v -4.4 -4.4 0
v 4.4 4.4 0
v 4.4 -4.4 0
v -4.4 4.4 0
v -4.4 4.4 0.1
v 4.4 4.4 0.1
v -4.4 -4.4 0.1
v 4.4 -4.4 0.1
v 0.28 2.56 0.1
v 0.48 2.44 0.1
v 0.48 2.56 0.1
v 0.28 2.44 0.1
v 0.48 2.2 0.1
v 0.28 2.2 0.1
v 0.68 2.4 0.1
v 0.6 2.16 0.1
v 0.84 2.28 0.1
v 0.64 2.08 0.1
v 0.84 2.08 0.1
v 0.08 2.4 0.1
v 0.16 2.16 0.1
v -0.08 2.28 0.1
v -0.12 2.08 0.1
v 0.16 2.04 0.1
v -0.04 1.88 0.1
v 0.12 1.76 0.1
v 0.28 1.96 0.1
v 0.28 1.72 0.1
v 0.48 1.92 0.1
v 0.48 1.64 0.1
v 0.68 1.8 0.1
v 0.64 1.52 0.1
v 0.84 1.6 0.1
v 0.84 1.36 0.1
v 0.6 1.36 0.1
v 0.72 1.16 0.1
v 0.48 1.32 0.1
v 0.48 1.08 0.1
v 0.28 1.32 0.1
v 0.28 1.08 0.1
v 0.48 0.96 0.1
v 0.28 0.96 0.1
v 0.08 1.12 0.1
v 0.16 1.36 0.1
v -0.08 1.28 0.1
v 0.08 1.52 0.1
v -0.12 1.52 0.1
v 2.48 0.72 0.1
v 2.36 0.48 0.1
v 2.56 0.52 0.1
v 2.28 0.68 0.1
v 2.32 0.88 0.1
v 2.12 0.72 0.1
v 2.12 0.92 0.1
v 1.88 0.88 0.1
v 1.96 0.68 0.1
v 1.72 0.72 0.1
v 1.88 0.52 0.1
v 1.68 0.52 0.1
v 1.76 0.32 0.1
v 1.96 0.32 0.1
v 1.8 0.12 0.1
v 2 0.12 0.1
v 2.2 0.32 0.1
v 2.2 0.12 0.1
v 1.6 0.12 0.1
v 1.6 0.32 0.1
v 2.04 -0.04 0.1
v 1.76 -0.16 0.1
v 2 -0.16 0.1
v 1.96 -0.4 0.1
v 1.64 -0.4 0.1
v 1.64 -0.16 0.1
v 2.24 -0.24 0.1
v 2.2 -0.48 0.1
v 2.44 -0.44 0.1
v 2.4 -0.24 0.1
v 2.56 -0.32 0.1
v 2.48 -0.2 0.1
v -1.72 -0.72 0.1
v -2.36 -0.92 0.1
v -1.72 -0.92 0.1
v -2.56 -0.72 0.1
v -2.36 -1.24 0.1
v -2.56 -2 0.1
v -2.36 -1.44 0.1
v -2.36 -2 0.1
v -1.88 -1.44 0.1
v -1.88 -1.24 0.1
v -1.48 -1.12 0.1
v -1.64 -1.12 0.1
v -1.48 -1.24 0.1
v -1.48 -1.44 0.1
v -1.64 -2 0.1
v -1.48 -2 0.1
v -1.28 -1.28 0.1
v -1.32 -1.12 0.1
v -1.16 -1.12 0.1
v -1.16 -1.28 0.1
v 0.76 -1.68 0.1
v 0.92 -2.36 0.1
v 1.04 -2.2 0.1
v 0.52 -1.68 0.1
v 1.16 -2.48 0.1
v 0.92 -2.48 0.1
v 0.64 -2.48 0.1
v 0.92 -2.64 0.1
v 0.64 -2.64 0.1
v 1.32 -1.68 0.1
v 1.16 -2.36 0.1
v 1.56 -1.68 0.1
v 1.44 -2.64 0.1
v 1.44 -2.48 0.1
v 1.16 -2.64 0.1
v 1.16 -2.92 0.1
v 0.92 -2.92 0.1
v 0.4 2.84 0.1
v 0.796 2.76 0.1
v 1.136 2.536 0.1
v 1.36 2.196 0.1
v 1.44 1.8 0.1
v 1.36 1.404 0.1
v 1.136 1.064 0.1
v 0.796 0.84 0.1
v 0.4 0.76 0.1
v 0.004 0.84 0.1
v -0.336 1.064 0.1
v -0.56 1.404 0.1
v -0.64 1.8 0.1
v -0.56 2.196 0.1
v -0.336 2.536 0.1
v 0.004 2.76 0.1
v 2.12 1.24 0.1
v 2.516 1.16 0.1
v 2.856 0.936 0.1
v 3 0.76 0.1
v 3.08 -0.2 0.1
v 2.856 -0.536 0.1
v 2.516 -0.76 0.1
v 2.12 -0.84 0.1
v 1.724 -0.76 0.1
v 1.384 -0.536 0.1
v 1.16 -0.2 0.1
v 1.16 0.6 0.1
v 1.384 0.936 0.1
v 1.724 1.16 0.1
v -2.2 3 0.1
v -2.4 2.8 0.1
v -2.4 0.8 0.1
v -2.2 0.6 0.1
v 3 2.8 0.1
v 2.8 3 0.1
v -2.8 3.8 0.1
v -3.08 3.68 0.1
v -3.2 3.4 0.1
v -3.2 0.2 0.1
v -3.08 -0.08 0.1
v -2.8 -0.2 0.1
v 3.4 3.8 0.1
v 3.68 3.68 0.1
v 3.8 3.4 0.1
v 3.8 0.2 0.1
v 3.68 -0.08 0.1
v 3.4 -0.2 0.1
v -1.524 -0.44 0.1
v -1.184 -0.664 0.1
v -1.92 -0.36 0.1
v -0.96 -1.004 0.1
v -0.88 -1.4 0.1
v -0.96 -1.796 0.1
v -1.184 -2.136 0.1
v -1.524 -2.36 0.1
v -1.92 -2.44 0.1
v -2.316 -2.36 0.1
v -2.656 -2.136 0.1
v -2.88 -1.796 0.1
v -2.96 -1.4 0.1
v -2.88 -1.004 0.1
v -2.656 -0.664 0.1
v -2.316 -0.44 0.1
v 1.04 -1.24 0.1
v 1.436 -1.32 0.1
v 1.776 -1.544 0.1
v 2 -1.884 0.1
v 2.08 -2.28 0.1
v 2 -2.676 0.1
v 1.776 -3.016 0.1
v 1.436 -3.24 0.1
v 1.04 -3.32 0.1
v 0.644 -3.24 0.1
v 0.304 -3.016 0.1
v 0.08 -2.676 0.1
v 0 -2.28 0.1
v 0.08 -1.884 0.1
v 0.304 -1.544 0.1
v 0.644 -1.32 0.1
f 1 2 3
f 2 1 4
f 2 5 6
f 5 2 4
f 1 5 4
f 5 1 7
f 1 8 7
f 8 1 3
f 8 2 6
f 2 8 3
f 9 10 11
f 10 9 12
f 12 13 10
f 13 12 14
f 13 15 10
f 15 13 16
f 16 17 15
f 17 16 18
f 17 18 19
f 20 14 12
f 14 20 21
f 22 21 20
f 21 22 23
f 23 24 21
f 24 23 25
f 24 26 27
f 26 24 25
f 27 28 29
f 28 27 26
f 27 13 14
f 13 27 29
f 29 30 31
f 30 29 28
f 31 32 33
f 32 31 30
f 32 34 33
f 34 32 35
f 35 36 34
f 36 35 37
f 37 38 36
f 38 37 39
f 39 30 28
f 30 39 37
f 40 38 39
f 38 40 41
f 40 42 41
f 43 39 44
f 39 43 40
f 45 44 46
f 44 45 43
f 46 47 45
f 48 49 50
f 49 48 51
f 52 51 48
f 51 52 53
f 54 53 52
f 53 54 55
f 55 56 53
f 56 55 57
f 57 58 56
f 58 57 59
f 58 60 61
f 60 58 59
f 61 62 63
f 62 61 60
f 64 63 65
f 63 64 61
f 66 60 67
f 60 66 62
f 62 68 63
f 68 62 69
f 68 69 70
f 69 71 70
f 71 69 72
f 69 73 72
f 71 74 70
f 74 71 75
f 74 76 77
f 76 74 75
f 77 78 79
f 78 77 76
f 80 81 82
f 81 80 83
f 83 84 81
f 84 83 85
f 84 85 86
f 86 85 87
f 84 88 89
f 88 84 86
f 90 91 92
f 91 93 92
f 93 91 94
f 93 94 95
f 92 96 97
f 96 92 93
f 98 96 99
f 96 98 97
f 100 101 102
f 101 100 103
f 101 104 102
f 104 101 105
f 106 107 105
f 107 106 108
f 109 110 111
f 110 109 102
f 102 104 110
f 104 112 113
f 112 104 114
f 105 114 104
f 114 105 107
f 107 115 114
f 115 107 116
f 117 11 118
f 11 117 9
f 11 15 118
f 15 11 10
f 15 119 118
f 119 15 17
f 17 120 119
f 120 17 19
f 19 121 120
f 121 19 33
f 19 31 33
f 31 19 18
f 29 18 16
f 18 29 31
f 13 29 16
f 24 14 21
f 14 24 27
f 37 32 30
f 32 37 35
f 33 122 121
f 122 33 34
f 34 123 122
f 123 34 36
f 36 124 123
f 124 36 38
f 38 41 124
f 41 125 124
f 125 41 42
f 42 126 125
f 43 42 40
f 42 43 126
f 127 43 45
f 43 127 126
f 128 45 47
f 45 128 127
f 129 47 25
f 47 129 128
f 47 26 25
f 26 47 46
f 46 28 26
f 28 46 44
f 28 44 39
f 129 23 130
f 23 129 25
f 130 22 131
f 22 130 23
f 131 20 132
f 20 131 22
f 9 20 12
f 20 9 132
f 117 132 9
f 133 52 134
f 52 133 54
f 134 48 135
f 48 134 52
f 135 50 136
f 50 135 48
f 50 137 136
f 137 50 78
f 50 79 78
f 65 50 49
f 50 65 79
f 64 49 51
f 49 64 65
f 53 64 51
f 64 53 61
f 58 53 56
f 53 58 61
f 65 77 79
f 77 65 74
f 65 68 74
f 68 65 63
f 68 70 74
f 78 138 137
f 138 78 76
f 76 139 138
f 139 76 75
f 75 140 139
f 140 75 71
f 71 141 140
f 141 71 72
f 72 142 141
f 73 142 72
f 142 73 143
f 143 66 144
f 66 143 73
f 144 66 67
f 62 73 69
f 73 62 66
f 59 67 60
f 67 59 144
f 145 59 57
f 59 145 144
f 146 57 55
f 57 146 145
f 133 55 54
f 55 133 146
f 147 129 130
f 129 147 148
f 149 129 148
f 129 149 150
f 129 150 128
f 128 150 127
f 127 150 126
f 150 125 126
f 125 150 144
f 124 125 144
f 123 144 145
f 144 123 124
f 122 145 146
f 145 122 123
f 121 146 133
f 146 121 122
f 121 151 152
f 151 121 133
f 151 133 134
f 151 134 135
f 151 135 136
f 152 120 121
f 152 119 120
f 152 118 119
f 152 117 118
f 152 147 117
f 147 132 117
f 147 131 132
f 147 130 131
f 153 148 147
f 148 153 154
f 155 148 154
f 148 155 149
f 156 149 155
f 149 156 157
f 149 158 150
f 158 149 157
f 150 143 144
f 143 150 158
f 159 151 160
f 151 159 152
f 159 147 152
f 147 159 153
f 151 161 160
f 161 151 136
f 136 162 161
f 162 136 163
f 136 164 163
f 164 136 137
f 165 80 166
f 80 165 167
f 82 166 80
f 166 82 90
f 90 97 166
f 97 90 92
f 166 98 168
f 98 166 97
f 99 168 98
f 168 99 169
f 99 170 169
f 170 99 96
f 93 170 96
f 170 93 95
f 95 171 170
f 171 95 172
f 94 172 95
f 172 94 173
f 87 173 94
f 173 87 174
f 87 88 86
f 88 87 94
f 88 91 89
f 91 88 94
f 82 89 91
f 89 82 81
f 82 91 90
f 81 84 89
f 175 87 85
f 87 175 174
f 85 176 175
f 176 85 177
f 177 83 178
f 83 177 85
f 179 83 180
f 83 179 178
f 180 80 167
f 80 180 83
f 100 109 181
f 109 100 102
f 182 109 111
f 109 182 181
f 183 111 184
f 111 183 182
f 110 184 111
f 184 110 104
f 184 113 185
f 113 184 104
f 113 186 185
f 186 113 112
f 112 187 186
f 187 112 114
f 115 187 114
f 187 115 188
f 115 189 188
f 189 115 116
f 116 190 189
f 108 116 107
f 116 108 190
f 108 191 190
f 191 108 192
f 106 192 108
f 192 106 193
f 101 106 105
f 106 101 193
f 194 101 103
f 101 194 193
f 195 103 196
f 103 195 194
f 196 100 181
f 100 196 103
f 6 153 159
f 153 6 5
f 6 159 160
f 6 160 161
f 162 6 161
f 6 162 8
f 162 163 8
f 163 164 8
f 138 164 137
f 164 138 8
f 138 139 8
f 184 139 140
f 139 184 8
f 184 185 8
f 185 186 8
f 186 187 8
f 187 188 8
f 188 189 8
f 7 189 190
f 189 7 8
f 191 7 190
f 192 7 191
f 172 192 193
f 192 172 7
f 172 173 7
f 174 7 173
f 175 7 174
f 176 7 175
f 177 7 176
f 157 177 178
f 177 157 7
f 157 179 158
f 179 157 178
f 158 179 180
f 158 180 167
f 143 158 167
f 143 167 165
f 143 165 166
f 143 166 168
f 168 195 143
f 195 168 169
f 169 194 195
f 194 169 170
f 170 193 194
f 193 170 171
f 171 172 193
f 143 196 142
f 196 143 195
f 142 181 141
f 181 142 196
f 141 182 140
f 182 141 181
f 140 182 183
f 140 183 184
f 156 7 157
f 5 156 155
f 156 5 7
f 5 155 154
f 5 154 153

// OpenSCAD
// file: ../p/box5-12.scad
use <../lib.scad>
function ldraw_lib__box5_12() = [
// 0 Box with 5 Faces without Any Edges
// 0 Name: box5-12.dat
// 0 Author: Chris Dee [cwdee]
// 0 !LDRAW_ORG Primitive UPDATE 2009-02
// 0 !LICENSE Licensed under CC BY 2.0 and CC BY 4.0 : see CAreadme.txt
// 
// 0 BFC CERTIFY CCW
  [0,"BFC","CERTIFY"],
  [0,"BFC","CCW"],
// 
// 0 !HISTORY 2009-09-03 [PTadmin] Official Update 2009-02
// 
// 
// 4 16 1 1 1 1 1 -1 -1 1 -1 -1 1 1
  [4,16,1,1,1,1,1,-1,-1,1,-1,-1,1,1],
// 4 16 -1 0 1 1 0 1 1 1 1 -1 1 1
  [4,16,-1,0,1,1,0,1,1,1,1,-1,1,1],
// 4 16 -1 0 -1 -1 0 1 -1 1 1 -1 1 -1
  [4,16,-1,0,-1,-1,0,1,-1,1,1,-1,1,-1],
// 4 16 1 0 -1 -1 0 -1 -1 1 -1 1 1 -1
  [4,16,1,0,-1,-1,0,-1,-1,1,-1,1,1,-1],
// 4 16 1 0 1 1 0 -1 1 1 -1 1 1 1
  [4,16,1,0,1,1,0,-1,1,1,-1,1,1,1],
// 0
];
makepoly(ldraw_lib__box5_12(), line=0.2);
// main file
use <../lib.scad>
use <../p/box5-12.scad>
function ldraw_lib__164555g() = [
// 0 Sticker  1.1 x  1.1 with White Banknote and Coins on Black Background
// 0 Name: 164555g.dat
// 0 Author: Takeshi Takahashi [RainbowDolphin]
// 0 !LDRAW_ORG Part UPDATE 2022-06
// 0 !LICENSE Licensed under CC BY 2.0 and CC BY 4.0 : see CAreadme.txt
// 
// 0 BFC CERTIFY CCW
  [0,"BFC","CERTIFY"],
  [0,"BFC","CCW"],
// 
// 0 !KEYWORDS Bricklink 4554stk01, Brickowl 156966, Briefcase, Currency exchange
// 0 !KEYWORDS Rebrickable 164555, Set 4554, Station, Train
// 
// 0 !HISTORY 2022-12-20 [PTadmin] Official Update 2022-06
// 
// 
// 1 16 0 -0.25 0 11 0 0 0 0.25 0 0 0 11 box5-12.dat
  [1,16,0,-0.25,0,11,0,0,0,0.25,0,0,0,11, ldraw_lib__box5_12()],
// 4 0 1.2 -0.25 6.4 0.7 -0.25 6.4 0.7 -0.25 6.1 1.2 -0.25 6.1
  [4,0,1.2,-0.25,6.4,0.7,-0.25,6.4,0.7,-0.25,6.1,1.2,-0.25,6.1],
// 4 0 1.2 -0.25 6.1 0.7 -0.25 6.1 0.7 -0.25 5.5 1.2 -0.25 5.5
  [4,0,1.2,-0.25,6.1,0.7,-0.25,6.1,0.7,-0.25,5.5,1.2,-0.25,5.5],
// 4 0 1.7 -0.25 6 1.2 -0.25 6.1 1.2 -0.25 5.5 1.5 -0.25 5.4
  [4,0,1.7,-0.25,6,1.2,-0.25,6.1,1.2,-0.25,5.5,1.5,-0.25,5.4],
// 4 0 2.1 -0.25 5.7 1.7 -0.25 6 1.5 -0.25 5.4 1.6 -0.25 5.2
  [4,0,2.1,-0.25,5.7,1.7,-0.25,6,1.5,-0.25,5.4,1.6,-0.25,5.2],
// 3 0 2.1 -0.25 5.7 1.6 -0.25 5.2 2.1 -0.25 5.2
  [3,0,2.1,-0.25,5.7,1.6,-0.25,5.2,2.1,-0.25,5.2],
// 4 0 0.7 -0.25 5.5 0.7 -0.25 6.1 0.2 -0.25 6 0.4 -0.25 5.4
  [4,0,0.7,-0.25,5.5,0.7,-0.25,6.1,0.2,-0.25,6,0.4,-0.25,5.4],
// 4 0 0.4 -0.25 5.4 0.2 -0.25 6 -0.2 -0.25 5.7 -0.3 -0.25 5.2
  [4,0,0.4,-0.25,5.4,0.2,-0.25,6,-0.2,-0.25,5.7,-0.3,-0.25,5.2],
// 4 0 0.4 -0.25 5.1 0.4 -0.25 5.4 -0.3 -0.25 5.2 -0.1 -0.25 4.7
  [4,0,0.4,-0.25,5.1,0.4,-0.25,5.4,-0.3,-0.25,5.2,-0.1,-0.25,4.7],
// 4 0 0.7 -0.25 4.9 0.4 -0.25 5.1 -0.1 -0.25 4.7 0.3 -0.25 4.4
  [4,0,0.7,-0.25,4.9,0.4,-0.25,5.1,-0.1,-0.25,4.7,0.3,-0.25,4.4],
// 4 0 0.7 -0.25 4.9 0.3 -0.25 4.4 0.7 -0.25 4.3 1.2 -0.25 4.8
  [4,0,0.7,-0.25,4.9,0.3,-0.25,4.4,0.7,-0.25,4.3,1.2,-0.25,4.8],
// 4 0 0.7 -0.25 4.9 1.2 -0.25 4.8 1.2 -0.25 5.5 0.7 -0.25 5.5
  [4,0,0.7,-0.25,4.9,1.2,-0.25,4.8,1.2,-0.25,5.5,0.7,-0.25,5.5],
// 4 0 1.2 -0.25 4.8 0.7 -0.25 4.3 1.2 -0.25 4.1 1.7 -0.25 4.5
  [4,0,1.2,-0.25,4.8,0.7,-0.25,4.3,1.2,-0.25,4.1,1.7,-0.25,4.5],
// 4 0 1.7 -0.25 4.5 1.2 -0.25 4.1 1.6 -0.25 3.8 2.1 -0.25 4
  [4,0,1.7,-0.25,4.5,1.2,-0.25,4.1,1.6,-0.25,3.8,2.1,-0.25,4],
// 4 0 2.1 -0.25 3.4 2.1 -0.25 4 1.6 -0.25 3.8 1.5 -0.25 3.4
  [4,0,2.1,-0.25,3.4,2.1,-0.25,4,1.6,-0.25,3.8,1.5,-0.25,3.4],
// 4 0 1.8 -0.25 2.9 2.1 -0.25 3.4 1.5 -0.25 3.4 1.2 -0.25 3.3
  [4,0,1.8,-0.25,2.9,2.1,-0.25,3.4,1.5,-0.25,3.4,1.2,-0.25,3.3],
// 4 0 1.2 -0.25 2.7 1.8 -0.25 2.9 1.2 -0.25 3.3 0.7 -0.25 3.3
  [4,0,1.2,-0.25,2.7,1.8,-0.25,2.9,1.2,-0.25,3.3,0.7,-0.25,3.3],
// 4 0 0.7 -0.25 3.3 1.2 -0.25 3.3 1.2 -0.25 4.1 0.7 -0.25 4.3
  [4,0,0.7,-0.25,3.3,1.2,-0.25,3.3,1.2,-0.25,4.1,0.7,-0.25,4.3],
// 4 0 1.2 -0.25 2.7 0.7 -0.25 3.3 0.7 -0.25 2.7 1.2 -0.25 2.4
  [4,0,1.2,-0.25,2.7,0.7,-0.25,3.3,0.7,-0.25,2.7,1.2,-0.25,2.4],
// 3 0 0.7 -0.25 2.7 0.7 -0.25 2.4 1.2 -0.25 2.4
  [3,0,0.7,-0.25,2.7,0.7,-0.25,2.4,1.2,-0.25,2.4],
// 4 0 0.2 -0.25 2.8 0.7 -0.25 2.7 0.7 -0.25 3.3 0.4 -0.25 3.4
  [4,0,0.2,-0.25,2.8,0.7,-0.25,2.7,0.7,-0.25,3.3,0.4,-0.25,3.4],
// 4 0 -0.2 -0.25 3.2 0.2 -0.25 2.8 0.4 -0.25 3.4 0.2 -0.25 3.8
  [4,0,-0.2,-0.25,3.2,0.2,-0.25,2.8,0.4,-0.25,3.4,0.2,-0.25,3.8],
// 3 0 0.2 -0.25 3.8 -0.3 -0.25 3.8 -0.2 -0.25 3.2
  [3,0,0.2,-0.25,3.8,-0.3,-0.25,3.8,-0.2,-0.25,3.2],
// 4 0 5.9 -0.25 1.2 6.4 -0.25 1.3 6.2 -0.25 1.8 5.7 -0.25 1.7
  [4,0,5.9,-0.25,1.2,6.4,-0.25,1.3,6.2,-0.25,1.8,5.7,-0.25,1.7],
// 4 0 5.7 -0.25 1.7 6.2 -0.25 1.8 5.8 -0.25 2.2 5.3 -0.25 1.8
  [4,0,5.7,-0.25,1.7,6.2,-0.25,1.8,5.8,-0.25,2.2,5.3,-0.25,1.8],
// 4 0 5.3 -0.25 1.8 5.8 -0.25 2.2 5.3 -0.25 2.3 4.7 -0.25 2.2
  [4,0,5.3,-0.25,1.8,5.8,-0.25,2.2,5.3,-0.25,2.3,4.7,-0.25,2.2],
// 4 0 4.9 -0.25 1.7 5.3 -0.25 1.8 4.7 -0.25 2.2 4.3 -0.25 1.8
  [4,0,4.9,-0.25,1.7,5.3,-0.25,1.8,4.7,-0.25,2.2,4.3,-0.25,1.8],
// 4 0 4.7 -0.25 1.3 4.9 -0.25 1.7 4.3 -0.25 1.8 4.2 -0.25 1.3
  [4,0,4.7,-0.25,1.3,4.9,-0.25,1.7,4.3,-0.25,1.8,4.2,-0.25,1.3],
// 4 0 4.7 -0.25 1.3 4.2 -0.25 1.3 4.4 -0.25 0.8 4.9 -0.25 0.8
  [4,0,4.7,-0.25,1.3,4.2,-0.25,1.3,4.4,-0.25,0.8,4.9,-0.25,0.8],
// 4 0 4.9 -0.25 0.8 4.4 -0.25 0.8 4.5 -0.25 0.3 5 -0.25 0.3
  [4,0,4.9,-0.25,0.8,4.4,-0.25,0.8,4.5,-0.25,0.3,5,-0.25,0.3],
// 4 0 5.5 -0.25 0.8 4.9 -0.25 0.8 5 -0.25 0.3 5.5 -0.25 0.3
  [4,0,5.5,-0.25,0.8,4.9,-0.25,0.8,5,-0.25,0.3,5.5,-0.25,0.3],
// 4 0 4.5 -0.25 0.3 4.4 -0.25 0.8 4 -0.25 0.8 4 -0.25 0.3
  [4,0,4.5,-0.25,0.3,4.4,-0.25,0.8,4,-0.25,0.8,4,-0.25,0.3],
// 4 0 5.1 -0.25 -0.1 5 -0.25 0.3 4.5 -0.25 0.3 4.4 -0.25 -0.4
  [4,0,5.1,-0.25,-0.1,5,-0.25,0.3,4.5,-0.25,0.3,4.4,-0.25,-0.4],
// 3 0 5.1 -0.25 -0.1 4.4 -0.25 -0.4 5 -0.25 -0.4
  [3,0,5.1,-0.25,-0.1,4.4,-0.25,-0.4,5,-0.25,-0.4],
// 4 0 4.9 -0.25 -1 5 -0.25 -0.4 4.4 -0.25 -0.4 4.1 -0.25 -1
  [4,0,4.9,-0.25,-1,5,-0.25,-0.4,4.4,-0.25,-0.4,4.1,-0.25,-1],
// 3 0 4.4 -0.25 -0.4 4.1 -0.25 -0.4 4.1 -0.25 -1
  [3,0,4.4,-0.25,-0.4,4.1,-0.25,-0.4,4.1,-0.25,-1],
// 4 0 5.6 -0.25 -0.6 5 -0.25 -0.4 4.9 -0.25 -1 5.5 -0.25 -1.2
  [4,0,5.6,-0.25,-0.6,5,-0.25,-0.4,4.9,-0.25,-1,5.5,-0.25,-1.2],
// 4 0 5.6 -0.25 -0.6 5.5 -0.25 -1.2 6.1 -0.25 -1.1 6 -0.25 -0.6
  [4,0,5.6,-0.25,-0.6,5.5,-0.25,-1.2,6.1,-0.25,-1.1,6,-0.25,-0.6],
// 4 0 6 -0.25 -0.6 6.1 -0.25 -1.1 6.4 -0.25 -0.8 6.2 -0.25 -0.5
  [4,0,6,-0.25,-0.6,6.1,-0.25,-1.1,6.4,-0.25,-0.8,6.2,-0.25,-0.5],
// 4 0 -6.4 -0.25 -1.8 -5.9 -0.25 -2.3 -4.3 -0.25 -2.3 -4.3 -0.25 -1.8
  [4,0,-6.4,-0.25,-1.8,-5.9,-0.25,-2.3,-4.3,-0.25,-2.3,-4.3,-0.25,-1.8],
// 4 0 -5.9 -0.25 -3.1 -5.9 -0.25 -2.3 -6.4 -0.25 -1.8 -6.4 -0.25 -5
  [4,0,-5.9,-0.25,-3.1,-5.9,-0.25,-2.3,-6.4,-0.25,-1.8,-6.4,-0.25,-5],
// 3 0 -5.9 -0.25 -3.1 -6.4 -0.25 -5 -5.9 -0.25 -3.6
  [3,0,-5.9,-0.25,-3.1,-6.4,-0.25,-5,-5.9,-0.25,-3.6],
// 3 0 -5.9 -0.25 -3.6 -6.4 -0.25 -5 -5.9 -0.25 -5
  [3,0,-5.9,-0.25,-3.6,-6.4,-0.25,-5,-5.9,-0.25,-5],
// 4 0 -4.7 -0.25 -3.1 -5.9 -0.25 -3.1 -5.9 -0.25 -3.6 -4.7 -0.25 -3.6
  [4,0,-4.7,-0.25,-3.1,-5.9,-0.25,-3.1,-5.9,-0.25,-3.6,-4.7,-0.25,-3.6],
// 3 0 -3.7 -0.25 -2.8 -4.1 -0.25 -2.8 -3.7 -0.25 -3.1
  [3,0,-3.7,-0.25,-2.8,-4.1,-0.25,-2.8,-3.7,-0.25,-3.1],
// 4 0 -3.7 -0.25 -3.6 -3.7 -0.25 -3.1 -4.1 -0.25 -2.8 -4.1 -0.25 -5
  [4,0,-3.7,-0.25,-3.6,-3.7,-0.25,-3.1,-4.1,-0.25,-2.8,-4.1,-0.25,-5],
// 3 0 -3.7 -0.25 -3.6 -4.1 -0.25 -5 -3.7 -0.25 -5
  [3,0,-3.7,-0.25,-3.6,-4.1,-0.25,-5,-3.7,-0.25,-5],
// 4 0 -3.3 -0.25 -2.8 -3.7 -0.25 -3.1 -3.7 -0.25 -3.6 -3.2 -0.25 -3.2
  [4,0,-3.3,-0.25,-2.8,-3.7,-0.25,-3.1,-3.7,-0.25,-3.6,-3.2,-0.25,-3.2],
// 4 0 -2.9 -0.25 -2.8 -3.3 -0.25 -2.8 -3.2 -0.25 -3.2 -2.9 -0.25 -3.2
  [4,0,-2.9,-0.25,-2.8,-3.3,-0.25,-2.8,-3.2,-0.25,-3.2,-2.9,-0.25,-3.2],
// 4 0 2.6 -0.25 -5.5 1.9 -0.25 -4.2 1.3 -0.25 -4.2 2.3 -0.25 -5.9
  [4,0,2.6,-0.25,-5.5,1.9,-0.25,-4.2,1.3,-0.25,-4.2,2.3,-0.25,-5.9],
// 4 0 2.6 -0.25 -5.5 2.3 -0.25 -5.9 2.3 -0.25 -6.2 2.9 -0.25 -6.2
  [4,0,2.6,-0.25,-5.5,2.3,-0.25,-5.9,2.3,-0.25,-6.2,2.9,-0.25,-6.2],
// 4 0 2.3 -0.25 -6.6 2.3 -0.25 -6.2 1.6 -0.25 -6.2 1.6 -0.25 -6.6
  [4,0,2.3,-0.25,-6.6,2.3,-0.25,-6.2,1.6,-0.25,-6.2,1.6,-0.25,-6.6],
// 4 0 3.9 -0.25 -4.2 3.3 -0.25 -4.2 2.6 -0.25 -5.5 2.9 -0.25 -5.9
  [4,0,3.9,-0.25,-4.2,3.3,-0.25,-4.2,2.6,-0.25,-5.5,2.9,-0.25,-5.9],
// 3 0 2.6 -0.25 -5.5 2.9 -0.25 -6.2 2.9 -0.25 -5.9
  [3,0,2.6,-0.25,-5.5,2.9,-0.25,-6.2,2.9,-0.25,-5.9],
// 4 0 3.6 -0.25 -6.2 2.9 -0.25 -6.2 2.9 -0.25 -6.6 3.6 -0.25 -6.6
  [4,0,3.6,-0.25,-6.2,2.9,-0.25,-6.2,2.9,-0.25,-6.6,3.6,-0.25,-6.6],
// 4 0 2.9 -0.25 -6.2 2.3 -0.25 -6.2 2.3 -0.25 -6.6 2.9 -0.25 -6.6
  [4,0,2.9,-0.25,-6.2,2.3,-0.25,-6.2,2.3,-0.25,-6.6,2.9,-0.25,-6.6],
// 4 0 2.9 -0.25 -6.6 2.3 -0.25 -6.6 2.3 -0.25 -7.3 2.9 -0.25 -7.3
  [4,0,2.9,-0.25,-6.6,2.3,-0.25,-6.6,2.3,-0.25,-7.3,2.9,-0.25,-7.3],
// 4 15 1 -0.25 7.1 0.7 -0.25 6.4 1.2 -0.25 6.4 1.99 -0.25 6.9
  [4,15,1,-0.25,7.1,0.7,-0.25,6.4,1.2,-0.25,6.4,1.99,-0.25,6.9],
// 4 15 1.99 -0.25 6.9 1.2 -0.25 6.4 1.2 -0.25 6.1 1.7 -0.25 6
  [4,15,1.99,-0.25,6.9,1.2,-0.25,6.4,1.2,-0.25,6.1,1.7,-0.25,6],
// 4 15 2.84 -0.25 6.34 1.99 -0.25 6.9 1.7 -0.25 6 2.1 -0.25 5.7
  [4,15,2.84,-0.25,6.34,1.99,-0.25,6.9,1.7,-0.25,6,2.1,-0.25,5.7],
// 4 15 3.4 -0.25 5.49 2.84 -0.25 6.34 2.1 -0.25 5.7 2.1 -0.25 5.2
  [4,15,3.4,-0.25,5.49,2.84,-0.25,6.34,2.1,-0.25,5.7,2.1,-0.25,5.2],
// 4 15 3.6 -0.25 4.5 3.4 -0.25 5.49 2.1 -0.25 5.2 2.1 -0.25 4
  [4,15,3.6,-0.25,4.5,3.4,-0.25,5.49,2.1,-0.25,5.2,2.1,-0.25,4],
// 4 15 1.7 -0.25 4.5 2.1 -0.25 4 2.1 -0.25 5.2 1.6 -0.25 5.2
  [4,15,1.7,-0.25,4.5,2.1,-0.25,4,2.1,-0.25,5.2,1.6,-0.25,5.2],
// 4 15 1.2 -0.25 4.8 1.7 -0.25 4.5 1.6 -0.25 5.2 1.5 -0.25 5.4
  [4,15,1.2,-0.25,4.8,1.7,-0.25,4.5,1.6,-0.25,5.2,1.5,-0.25,5.4],
// 3 15 1.2 -0.25 5.5 1.2 -0.25 4.8 1.5 -0.25 5.4
  [3,15,1.2,-0.25,5.5,1.2,-0.25,4.8,1.5,-0.25,5.4],
// 4 15 0.7 -0.25 4.9 0.7 -0.25 5.5 0.4 -0.25 5.4 0.4 -0.25 5.1
  [4,15,0.7,-0.25,4.9,0.7,-0.25,5.5,0.4,-0.25,5.4,0.4,-0.25,5.1],
// 4 15 1.2 -0.25 4.1 1.2 -0.25 3.3 1.5 -0.25 3.4 1.6 -0.25 3.8
  [4,15,1.2,-0.25,4.1,1.2,-0.25,3.3,1.5,-0.25,3.4,1.6,-0.25,3.8],
// 4 15 3.4 -0.25 3.51 3.6 -0.25 4.5 2.1 -0.25 4 2.1 -0.25 3.4
  [4,15,3.4,-0.25,3.51,3.6,-0.25,4.5,2.1,-0.25,4,2.1,-0.25,3.4],
// 4 15 2.84 -0.25 2.66 3.4 -0.25 3.51 2.1 -0.25 3.4 1.8 -0.25 2.9
  [4,15,2.84,-0.25,2.66,3.4,-0.25,3.51,2.1,-0.25,3.4,1.8,-0.25,2.9],
// 4 15 1.99 -0.25 2.1 2.84 -0.25 2.66 1.8 -0.25 2.9 1.2 -0.25 2.7
  [4,15,1.99,-0.25,2.1,2.84,-0.25,2.66,1.8,-0.25,2.9,1.2,-0.25,2.7],
// 3 15 1.2 -0.25 2.7 1.2 -0.25 2.4 1.99 -0.25 2.1
  [3,15,1.2,-0.25,2.7,1.2,-0.25,2.4,1.99,-0.25,2.1],
// 4 15 1 -0.25 1.9 1.99 -0.25 2.1 1.2 -0.25 2.4 0.7 -0.25 2.4
  [4,15,1,-0.25,1.9,1.99,-0.25,2.1,1.2,-0.25,2.4,0.7,-0.25,2.4],
// 3 15 0.7 -0.25 2.4 0.01 -0.25 2.1 1 -0.25 1.9
  [3,15,0.7,-0.25,2.4,0.01,-0.25,2.1,1,-0.25,1.9],
// 4 15 0.01 -0.25 2.1 0.7 -0.25 2.4 0.7 -0.25 2.7 0.2 -0.25 2.8
  [4,15,0.01,-0.25,2.1,0.7,-0.25,2.4,0.7,-0.25,2.7,0.2,-0.25,2.8],
// 4 15 -0.84 -0.25 2.66 0.01 -0.25 2.1 0.2 -0.25 2.8 -0.2 -0.25 3.2
  [4,15,-0.84,-0.25,2.66,0.01,-0.25,2.1,0.2,-0.25,2.8,-0.2,-0.25,3.2],
// 4 15 -1.4 -0.25 3.51 -0.84 -0.25 2.66 -0.2 -0.25 3.2 -0.3 -0.25 3.8
  [4,15,-1.4,-0.25,3.51,-0.84,-0.25,2.66,-0.2,-0.25,3.2,-0.3,-0.25,3.8],
// 4 15 -1.6 -0.25 4.5 -1.4 -0.25 3.51 -0.3 -0.25 3.8 -0.1 -0.25 4.7
  [4,15,-1.6,-0.25,4.5,-1.4,-0.25,3.51,-0.3,-0.25,3.8,-0.1,-0.25,4.7],
// 4 15 -0.1 -0.25 4.7 -0.3 -0.25 3.8 0.2 -0.25 3.8 0.3 -0.25 4.4
  [4,15,-0.1,-0.25,4.7,-0.3,-0.25,3.8,0.2,-0.25,3.8,0.3,-0.25,4.4],
// 4 15 0.3 -0.25 4.4 0.2 -0.25 3.8 0.4 -0.25 3.4 0.7 -0.25 4.3
  [4,15,0.3,-0.25,4.4,0.2,-0.25,3.8,0.4,-0.25,3.4,0.7,-0.25,4.3],
// 3 15 0.7 -0.25 4.3 0.4 -0.25 3.4 0.7 -0.25 3.3
  [3,15,0.7,-0.25,4.3,0.4,-0.25,3.4,0.7,-0.25,3.3],
// 4 15 -1.6 -0.25 4.5 -0.1 -0.25 4.7 -0.3 -0.25 5.2 -1.4 -0.25 5.49
  [4,15,-1.6,-0.25,4.5,-0.1,-0.25,4.7,-0.3,-0.25,5.2,-1.4,-0.25,5.49],
// 4 15 -1.4 -0.25 5.49 -0.3 -0.25 5.2 -0.2 -0.25 5.7 -0.84 -0.25 6.34
  [4,15,-1.4,-0.25,5.49,-0.3,-0.25,5.2,-0.2,-0.25,5.7,-0.84,-0.25,6.34],
// 4 15 -0.84 -0.25 6.34 -0.2 -0.25 5.7 0.2 -0.25 6 0.01 -0.25 6.9
  [4,15,-0.84,-0.25,6.34,-0.2,-0.25,5.7,0.2,-0.25,6,0.01,-0.25,6.9],
// 4 15 0.01 -0.25 6.9 0.2 -0.25 6 0.7 -0.25 6.1 0.7 -0.25 6.4
  [4,15,0.01,-0.25,6.9,0.2,-0.25,6,0.7,-0.25,6.1,0.7,-0.25,6.4],
// 3 15 1 -0.25 7.1 0.01 -0.25 6.9 0.7 -0.25 6.4
  [3,15,1,-0.25,7.1,0.01,-0.25,6.9,0.7,-0.25,6.4],
// 4 15 6.29 -0.25 2.9 5.3 -0.25 3.1 5.3 -0.25 2.3 5.8 -0.25 2.2
  [4,15,6.29,-0.25,2.9,5.3,-0.25,3.1,5.3,-0.25,2.3,5.8,-0.25,2.2],
// 4 15 7.14 -0.25 2.34 6.29 -0.25 2.9 5.8 -0.25 2.2 6.2 -0.25 1.8
  [4,15,7.14,-0.25,2.34,6.29,-0.25,2.9,5.8,-0.25,2.2,6.2,-0.25,1.8],
// 4 15 7.14 -0.25 2.34 6.2 -0.25 1.8 6.4 -0.25 1.3 7.5 -0.25 1.9
  [4,15,7.14,-0.25,2.34,6.2,-0.25,1.8,6.4,-0.25,1.3,7.5,-0.25,1.9],
// 4 15 7.7 -0.25 -0.5 7.5 -0.25 1.9 6.4 -0.25 1.3 6.4 -0.25 -0.8
  [4,15,7.7,-0.25,-0.5,7.5,-0.25,1.9,6.4,-0.25,1.3,6.4,-0.25,-0.8],
// 3 15 6.4 -0.25 1.3 6.2 -0.25 -0.5 6.4 -0.25 -0.8
  [3,15,6.4,-0.25,1.3,6.2,-0.25,-0.5,6.4,-0.25,-0.8],
// 4 15 5.5 -0.25 0.3 6.2 -0.25 -0.5 6.4 -0.25 1.3 5.9 -0.25 1.2
  [4,15,5.5,-0.25,0.3,6.2,-0.25,-0.5,6.4,-0.25,1.3,5.9,-0.25,1.2],
// 4 15 5.5 -0.25 0.8 5.5 -0.25 0.3 5.9 -0.25 1.2 5.7 -0.25 1.7
  [4,15,5.5,-0.25,0.8,5.5,-0.25,0.3,5.9,-0.25,1.2,5.7,-0.25,1.7],
// 4 15 4.9 -0.25 0.8 5.5 -0.25 0.8 5.7 -0.25 1.7 5.3 -0.25 1.8
  [4,15,4.9,-0.25,0.8,5.5,-0.25,0.8,5.7,-0.25,1.7,5.3,-0.25,1.8],
// 4 15 4.7 -0.25 1.3 4.9 -0.25 0.8 5.3 -0.25 1.8 4.9 -0.25 1.7
  [4,15,4.7,-0.25,1.3,4.9,-0.25,0.8,5.3,-0.25,1.8,4.9,-0.25,1.7],
// 4 15 6 -0.25 -0.6 6.2 -0.25 -0.5 5.5 -0.25 0.3 5.6 -0.25 -0.6
  [4,15,6,-0.25,-0.6,6.2,-0.25,-0.5,5.5,-0.25,0.3,5.6,-0.25,-0.6],
// 4 15 5.1 -0.25 -0.1 5.6 -0.25 -0.6 5.5 -0.25 0.3 5 -0.25 0.3
  [4,15,5.1,-0.25,-0.1,5.6,-0.25,-0.6,5.5,-0.25,0.3,5,-0.25,0.3],
// 3 15 5.1 -0.25 -0.1 5 -0.25 -0.4 5.6 -0.25 -0.6
  [3,15,5.1,-0.25,-0.1,5,-0.25,-0.4,5.6,-0.25,-0.6],
// 4 15 7.14 -0.25 -1.34 7.7 -0.25 -0.5 6.4 -0.25 -0.8 6.1 -0.25 -1.1
  [4,15,7.14,-0.25,-1.34,7.7,-0.25,-0.5,6.4,-0.25,-0.8,6.1,-0.25,-1.1],
// 4 15 6.29 -0.25 -1.9 7.14 -0.25 -1.34 6.1 -0.25 -1.1 5.5 -0.25 -1.2
  [4,15,6.29,-0.25,-1.9,7.14,-0.25,-1.34,6.1,-0.25,-1.1,5.5,-0.25,-1.2],
// 4 15 5.3 -0.25 -2.1 6.29 -0.25 -1.9 5.5 -0.25 -1.2 4.9 -0.25 -1
  [4,15,5.3,-0.25,-2.1,6.29,-0.25,-1.9,5.5,-0.25,-1.2,4.9,-0.25,-1],
// 4 15 4.31 -0.25 -1.9 5.3 -0.25 -2.1 4.9 -0.25 -1 4.1 -0.25 -1
  [4,15,4.31,-0.25,-1.9,5.3,-0.25,-2.1,4.9,-0.25,-1,4.1,-0.25,-1],
// 3 15 4.1 -0.25 -1 3.46 -0.25 -1.34 4.31 -0.25 -1.9
  [3,15,4.1,-0.25,-1,3.46,-0.25,-1.34,4.31,-0.25,-1.9],
// 4 15 3.46 -0.25 -1.34 4.1 -0.25 -1 4.1 -0.25 -0.4 2.9 -0.25 -0.5
  [4,15,3.46,-0.25,-1.34,4.1,-0.25,-1,4.1,-0.25,-0.4,2.9,-0.25,-0.5],
// 4 15 2.9 -0.25 -0.5 4.1 -0.25 -0.4 4 -0.25 0.3 2.9 -0.25 1.5
  [4,15,2.9,-0.25,-0.5,4.1,-0.25,-0.4,4,-0.25,0.3,2.9,-0.25,1.5],
// 3 15 2.9 -0.25 1.5 4 -0.25 0.3 4 -0.25 0.8
  [3,15,2.9,-0.25,1.5,4,-0.25,0.3,4,-0.25,0.8],
// 4 15 4 -0.25 0.3 4.1 -0.25 -0.4 4.4 -0.25 -0.4 4.5 -0.25 0.3
  [4,15,4,-0.25,0.3,4.1,-0.25,-0.4,4.4,-0.25,-0.4,4.5,-0.25,0.3],
// 4 15 4.2 -0.25 1.3 2.9 -0.25 1.5 4 -0.25 0.8 4.4 -0.25 0.8
  [4,15,4.2,-0.25,1.3,2.9,-0.25,1.5,4,-0.25,0.8,4.4,-0.25,0.8],
// 4 15 3.46 -0.25 2.34 2.9 -0.25 1.5 4.2 -0.25 1.3 4.3 -0.25 1.8
  [4,15,3.46,-0.25,2.34,2.9,-0.25,1.5,4.2,-0.25,1.3,4.3,-0.25,1.8],
// 4 15 4.31 -0.25 2.9 3.46 -0.25 2.34 4.3 -0.25 1.8 4.7 -0.25 2.2
  [4,15,4.31,-0.25,2.9,3.46,-0.25,2.34,4.3,-0.25,1.8,4.7,-0.25,2.2],
// 4 15 5.3 -0.25 3.1 4.31 -0.25 2.9 4.7 -0.25 2.2 5.3 -0.25 2.3
  [4,15,5.3,-0.25,3.1,4.31,-0.25,2.9,4.7,-0.25,2.2,5.3,-0.25,2.3],
// 4 0 -1.4 -0.25 5.49 -5.5 -0.25 7.5 -6 -0.25 7 -1.6 -0.25 4.5
  [4,0,-1.4,-0.25,5.49,-5.5,-0.25,7.5,-6,-0.25,7,-1.6,-0.25,4.5],
// 4 0 -1.6 -0.25 4.5 -6 -0.25 7 -6 -0.25 2 -5.5 -0.25 1.5
  [4,0,-1.6,-0.25,4.5,-6,-0.25,7,-6,-0.25,2,-5.5,-0.25,1.5],
// 3 0 -1.6 -0.25 4.5 -5.5 -0.25 1.5 -1.4 -0.25 3.51
  [3,0,-1.6,-0.25,4.5,-5.5,-0.25,1.5,-1.4,-0.25,3.51],
// 3 0 -1.4 -0.25 3.51 -5.5 -0.25 1.5 -0.84 -0.25 2.66
  [3,0,-1.4,-0.25,3.51,-5.5,-0.25,1.5,-0.84,-0.25,2.66],
// 3 0 -0.84 -0.25 2.66 -5.5 -0.25 1.5 0.01 -0.25 2.1
  [3,0,-0.84,-0.25,2.66,-5.5,-0.25,1.5,0.01,-0.25,2.1],
// 4 0 1 -0.25 1.9 0.01 -0.25 2.1 -5.5 -0.25 1.5 2.9 -0.25 1.5
  [4,0,1,-0.25,1.9,0.01,-0.25,2.1,-5.5,-0.25,1.5,2.9,-0.25,1.5],
// 3 0 1.99 -0.25 2.1 1 -0.25 1.9 2.9 -0.25 1.5
  [3,0,1.99,-0.25,2.1,1,-0.25,1.9,2.9,-0.25,1.5],
// 4 0 2.84 -0.25 2.66 1.99 -0.25 2.1 2.9 -0.25 1.5 3.46 -0.25 2.34
  [4,0,2.84,-0.25,2.66,1.99,-0.25,2.1,2.9,-0.25,1.5,3.46,-0.25,2.34],
// 4 0 3.4 -0.25 3.51 2.84 -0.25 2.66 3.46 -0.25 2.34 4.31 -0.25 2.9
  [4,0,3.4,-0.25,3.51,2.84,-0.25,2.66,3.46,-0.25,2.34,4.31,-0.25,2.9],
// 4 0 3.6 -0.25 4.5 3.4 -0.25 3.51 4.31 -0.25 2.9 5.3 -0.25 3.1
  [4,0,3.6,-0.25,4.5,3.4,-0.25,3.51,4.31,-0.25,2.9,5.3,-0.25,3.1],
// 4 0 7 -0.25 7.5 3.6 -0.25 4.5 5.3 -0.25 3.1 7.5 -0.25 7
  [4,0,7,-0.25,7.5,3.6,-0.25,4.5,5.3,-0.25,3.1,7.5,-0.25,7],
// 3 0 7.5 -0.25 7 5.3 -0.25 3.1 6.29 -0.25 2.9
  [3,0,7.5,-0.25,7,5.3,-0.25,3.1,6.29,-0.25,2.9],
// 3 0 7.5 -0.25 7 6.29 -0.25 2.9 7.14 -0.25 2.34
  [3,0,7.5,-0.25,7,6.29,-0.25,2.9,7.14,-0.25,2.34],
// 3 0 7.5 -0.25 7 7.14 -0.25 2.34 7.5 -0.25 1.9
  [3,0,7.5,-0.25,7,7.14,-0.25,2.34,7.5,-0.25,1.9],
// 3 0 7 -0.25 7.5 3.4 -0.25 5.49 3.6 -0.25 4.5
  [3,0,7,-0.25,7.5,3.4,-0.25,5.49,3.6,-0.25,4.5],
// 3 0 7 -0.25 7.5 2.84 -0.25 6.34 3.4 -0.25 5.49
  [3,0,7,-0.25,7.5,2.84,-0.25,6.34,3.4,-0.25,5.49],
// 3 0 7 -0.25 7.5 1.99 -0.25 6.9 2.84 -0.25 6.34
  [3,0,7,-0.25,7.5,1.99,-0.25,6.9,2.84,-0.25,6.34],
// 3 0 7 -0.25 7.5 1 -0.25 7.1 1.99 -0.25 6.9
  [3,0,7,-0.25,7.5,1,-0.25,7.1,1.99,-0.25,6.9],
// 3 0 7 -0.25 7.5 -5.5 -0.25 7.5 1 -0.25 7.1
  [3,0,7,-0.25,7.5,-5.5,-0.25,7.5,1,-0.25,7.1],
// 3 0 -5.5 -0.25 7.5 0.01 -0.25 6.9 1 -0.25 7.1
  [3,0,-5.5,-0.25,7.5,0.01,-0.25,6.9,1,-0.25,7.1],
// 3 0 -5.5 -0.25 7.5 -0.84 -0.25 6.34 0.01 -0.25 6.9
  [3,0,-5.5,-0.25,7.5,-0.84,-0.25,6.34,0.01,-0.25,6.9],
// 3 0 -5.5 -0.25 7.5 -1.4 -0.25 5.49 -0.84 -0.25 6.34
  [3,0,-5.5,-0.25,7.5,-1.4,-0.25,5.49,-0.84,-0.25,6.34],
// 4 15 -5.5 -0.25 7.5 -7 -0.25 9.5 -7.7 -0.25 9.2 -6 -0.25 7
  [4,15,-5.5,-0.25,7.5,-7,-0.25,9.5,-7.7,-0.25,9.2,-6,-0.25,7],
// 4 15 -6 -0.25 7 -7.7 -0.25 9.2 -8 -0.25 8.5 -6 -0.25 2
  [4,15,-6,-0.25,7,-7.7,-0.25,9.2,-8,-0.25,8.5,-6,-0.25,2],
// 4 15 -6 -0.25 2 -8 -0.25 8.5 -8 -0.25 0.5 -7.7 -0.25 -0.2
  [4,15,-6,-0.25,2,-8,-0.25,8.5,-8,-0.25,0.5,-7.7,-0.25,-0.2],
// 4 15 -5.5 -0.25 1.5 -6 -0.25 2 -7.7 -0.25 -0.2 -7 -0.25 -0.5
  [4,15,-5.5,-0.25,1.5,-6,-0.25,2,-7.7,-0.25,-0.2,-7,-0.25,-0.5],
// 4 15 2.9 -0.25 1.5 -5.5 -0.25 1.5 -7 -0.25 -0.5 2.9 -0.25 -0.5
  [4,15,2.9,-0.25,1.5,-5.5,-0.25,1.5,-7,-0.25,-0.5,2.9,-0.25,-0.5],
// 4 15 7 -0.25 7.5 7.5 -0.25 7 9.2 -0.25 9.2 8.5 -0.25 9.5
  [4,15,7,-0.25,7.5,7.5,-0.25,7,9.2,-0.25,9.2,8.5,-0.25,9.5],
// 4 15 -5.5 -0.25 7.5 7 -0.25 7.5 8.5 -0.25 9.5 -7 -0.25 9.5
  [4,15,-5.5,-0.25,7.5,7,-0.25,7.5,8.5,-0.25,9.5,-7,-0.25,9.5],
// 4 15 9.5 -0.25 8.5 9.2 -0.25 9.2 7.5 -0.25 7 7.5 -0.25 1.9
  [4,15,9.5,-0.25,8.5,9.2,-0.25,9.2,7.5,-0.25,7,7.5,-0.25,1.9],
// 4 15 9.5 -0.25 0.5 9.5 -0.25 8.5 7.5 -0.25 1.9 9.2 -0.25 -0.2
  [4,15,9.5,-0.25,0.5,9.5,-0.25,8.5,7.5,-0.25,1.9,9.2,-0.25,-0.2],
// 4 15 8.5 -0.25 -0.5 9.2 -0.25 -0.2 7.5 -0.25 1.9 7.7 -0.25 -0.5
  [4,15,8.5,-0.25,-0.5,9.2,-0.25,-0.2,7.5,-0.25,1.9,7.7,-0.25,-0.5],
// 4 15 -3.81 -0.25 -1.1 -4.8 -0.25 -0.9 -4.3 -0.25 -1.8 -2.96 -0.25 -1.66
  [4,15,-3.81,-0.25,-1.1,-4.8,-0.25,-0.9,-4.3,-0.25,-1.8,-2.96,-0.25,-1.66],
// 4 15 -2.96 -0.25 -1.66 -4.3 -0.25 -1.8 -4.3 -0.25 -2.3 -3.7 -0.25 -2.8
  [4,15,-2.96,-0.25,-1.66,-4.3,-0.25,-1.8,-4.3,-0.25,-2.3,-3.7,-0.25,-2.8],
// 4 15 -3.3 -0.25 -2.8 -2.96 -0.25 -1.66 -3.7 -0.25 -2.8 -3.7 -0.25 -3.1
  [4,15,-3.3,-0.25,-2.8,-2.96,-0.25,-1.66,-3.7,-0.25,-2.8,-3.7,-0.25,-3.1],
// 4 15 -2.96 -0.25 -1.66 -3.3 -0.25 -2.8 -2.9 -0.25 -2.8 -2.4 -0.25 -2.51
  [4,15,-2.96,-0.25,-1.66,-3.3,-0.25,-2.8,-2.9,-0.25,-2.8,-2.4,-0.25,-2.51],
// 4 15 -2.4 -0.25 -2.51 -2.9 -0.25 -2.8 -2.9 -0.25 -3.2 -2.2 -0.25 -3.5
  [4,15,-2.4,-0.25,-2.51,-2.9,-0.25,-2.8,-2.9,-0.25,-3.2,-2.2,-0.25,-3.5],
// 4 15 -2.4 -0.25 -4.49 -2.2 -0.25 -3.5 -2.9 -0.25 -3.2 -3.2 -0.25 -3.2
  [4,15,-2.4,-0.25,-4.49,-2.2,-0.25,-3.5,-2.9,-0.25,-3.2,-3.2,-0.25,-3.2],
// 4 15 -2.4 -0.25 -4.49 -3.2 -0.25 -3.2 -3.7 -0.25 -3.6 -3.7 -0.25 -5
  [4,15,-2.4,-0.25,-4.49,-3.2,-0.25,-3.2,-3.7,-0.25,-3.6,-3.7,-0.25,-5],
// 4 15 -2.96 -0.25 -5.34 -2.4 -0.25 -4.49 -3.7 -0.25 -5 -3.81 -0.25 -5.9
  [4,15,-2.96,-0.25,-5.34,-2.4,-0.25,-4.49,-3.7,-0.25,-5,-3.81,-0.25,-5.9],
// 4 15 -3.81 -0.25 -5.9 -3.7 -0.25 -5 -4.1 -0.25 -5 -4.8 -0.25 -6.1
  [4,15,-3.81,-0.25,-5.9,-3.7,-0.25,-5,-4.1,-0.25,-5,-4.8,-0.25,-6.1],
// 4 15 -5.79 -0.25 -5.9 -4.8 -0.25 -6.1 -4.1 -0.25 -5 -5.9 -0.25 -5
  [4,15,-5.79,-0.25,-5.9,-4.8,-0.25,-6.1,-4.1,-0.25,-5,-5.9,-0.25,-5],
// 4 15 -5.9 -0.25 -5 -4.1 -0.25 -5 -4.7 -0.25 -3.6 -5.9 -0.25 -3.6
  [4,15,-5.9,-0.25,-5,-4.1,-0.25,-5,-4.7,-0.25,-3.6,-5.9,-0.25,-3.6],
// 4 15 -4.7 -0.25 -3.6 -4.1 -0.25 -5 -4.1 -0.25 -2.8 -4.7 -0.25 -3.1
  [4,15,-4.7,-0.25,-3.6,-4.1,-0.25,-5,-4.1,-0.25,-2.8,-4.7,-0.25,-3.1],
// 4 15 -4.7 -0.25 -3.1 -4.1 -0.25 -2.8 -4.3 -0.25 -2.3 -5.9 -0.25 -2.3
  [4,15,-4.7,-0.25,-3.1,-4.1,-0.25,-2.8,-4.3,-0.25,-2.3,-5.9,-0.25,-2.3],
// 3 15 -4.3 -0.25 -2.3 -4.1 -0.25 -2.8 -3.7 -0.25 -2.8
  [3,15,-4.3,-0.25,-2.3,-4.1,-0.25,-2.8,-3.7,-0.25,-2.8],
// 3 15 -5.9 -0.25 -2.3 -5.9 -0.25 -3.1 -4.7 -0.25 -3.1
  [3,15,-5.9,-0.25,-2.3,-5.9,-0.25,-3.1,-4.7,-0.25,-3.1],
// 4 15 -5.79 -0.25 -5.9 -5.9 -0.25 -5 -6.4 -0.25 -5 -6.64 -0.25 -5.34
  [4,15,-5.79,-0.25,-5.9,-5.9,-0.25,-5,-6.4,-0.25,-5,-6.64,-0.25,-5.34],
// 4 15 -7.2 -0.25 -4.49 -6.64 -0.25 -5.34 -6.4 -0.25 -5 -7.4 -0.25 -3.5
  [4,15,-7.2,-0.25,-4.49,-6.64,-0.25,-5.34,-6.4,-0.25,-5,-7.4,-0.25,-3.5],
// 4 15 -7.4 -0.25 -3.5 -6.4 -0.25 -5 -6.4 -0.25 -1.8 -7.2 -0.25 -2.51
  [4,15,-7.4,-0.25,-3.5,-6.4,-0.25,-5,-6.4,-0.25,-1.8,-7.2,-0.25,-2.51],
// 4 15 -6.64 -0.25 -1.66 -7.2 -0.25 -2.51 -6.4 -0.25 -1.8 -5.79 -0.25 -1.1
  [4,15,-6.64,-0.25,-1.66,-7.2,-0.25,-2.51,-6.4,-0.25,-1.8,-5.79,-0.25,-1.1],
// 4 15 -5.79 -0.25 -1.1 -6.4 -0.25 -1.8 -4.3 -0.25 -1.8 -4.8 -0.25 -0.9
  [4,15,-5.79,-0.25,-1.1,-6.4,-0.25,-1.8,-4.3,-0.25,-1.8,-4.8,-0.25,-0.9],
// 4 15 3.3 -0.25 -4.2 2.6 -0.25 -3.1 1.9 -0.25 -4.2 2.6 -0.25 -5.5
  [4,15,3.3,-0.25,-4.2,2.6,-0.25,-3.1,1.9,-0.25,-4.2,2.6,-0.25,-5.5],
// 4 15 3.59 -0.25 -3.3 2.6 -0.25 -3.1 3.3 -0.25 -4.2 3.9 -0.25 -4.2
  [4,15,3.59,-0.25,-3.3,2.6,-0.25,-3.1,3.3,-0.25,-4.2,3.9,-0.25,-4.2],
// 4 15 4.44 -0.25 -3.86 3.59 -0.25 -3.3 3.9 -0.25 -4.2 5 -0.25 -4.71
  [4,15,4.44,-0.25,-3.86,3.59,-0.25,-3.3,3.9,-0.25,-4.2,5,-0.25,-4.71],
// 4 15 5 -0.25 -4.71 3.9 -0.25 -4.2 2.9 -0.25 -5.9 2.9 -0.25 -6.2
  [4,15,5,-0.25,-4.71,3.9,-0.25,-4.2,2.9,-0.25,-5.9,2.9,-0.25,-6.2],
// 4 15 5 -0.25 -4.71 2.9 -0.25 -6.2 3.6 -0.25 -6.2 5.2 -0.25 -5.7
  [4,15,5,-0.25,-4.71,2.9,-0.25,-6.2,3.6,-0.25,-6.2,5.2,-0.25,-5.7],
// 4 15 5 -0.25 -6.69 5.2 -0.25 -5.7 3.6 -0.25 -6.2 3.6 -0.25 -6.6
  [4,15,5,-0.25,-6.69,5.2,-0.25,-5.7,3.6,-0.25,-6.2,3.6,-0.25,-6.6],
// 4 15 4.44 -0.25 -7.54 5 -0.25 -6.69 3.6 -0.25 -6.6 2.9 -0.25 -6.6
  [4,15,4.44,-0.25,-7.54,5,-0.25,-6.69,3.6,-0.25,-6.6,2.9,-0.25,-6.6],
// 4 15 3.59 -0.25 -8.1 4.44 -0.25 -7.54 2.9 -0.25 -6.6 2.9 -0.25 -7.3
  [4,15,3.59,-0.25,-8.1,4.44,-0.25,-7.54,2.9,-0.25,-6.6,2.9,-0.25,-7.3],
// 4 15 2.6 -0.25 -8.3 3.59 -0.25 -8.1 2.9 -0.25 -7.3 2.3 -0.25 -7.3
  [4,15,2.6,-0.25,-8.3,3.59,-0.25,-8.1,2.9,-0.25,-7.3,2.3,-0.25,-7.3],
// 3 15 2.3 -0.25 -7.3 1.61 -0.25 -8.1 2.6 -0.25 -8.3
  [3,15,2.3,-0.25,-7.3,1.61,-0.25,-8.1,2.6,-0.25,-8.3],
// 4 15 1.61 -0.25 -8.1 2.3 -0.25 -7.3 2.3 -0.25 -6.6 1.6 -0.25 -6.6
  [4,15,1.61,-0.25,-8.1,2.3,-0.25,-7.3,2.3,-0.25,-6.6,1.6,-0.25,-6.6],
// 4 15 0.76 -0.25 -7.54 1.61 -0.25 -8.1 1.6 -0.25 -6.6 0.2 -0.25 -6.69
  [4,15,0.76,-0.25,-7.54,1.61,-0.25,-8.1,1.6,-0.25,-6.6,0.2,-0.25,-6.69],
// 4 15 0.2 -0.25 -6.69 1.6 -0.25 -6.6 1.6 -0.25 -6.2 0 -0.25 -5.7
  [4,15,0.2,-0.25,-6.69,1.6,-0.25,-6.6,1.6,-0.25,-6.2,0,-0.25,-5.7],
// 4 15 2.3 -0.25 -5.9 0 -0.25 -5.7 1.6 -0.25 -6.2 2.3 -0.25 -6.2
  [4,15,2.3,-0.25,-5.9,0,-0.25,-5.7,1.6,-0.25,-6.2,2.3,-0.25,-6.2],
// 4 15 0.2 -0.25 -4.71 0 -0.25 -5.7 2.3 -0.25 -5.9 1.3 -0.25 -4.2
  [4,15,0.2,-0.25,-4.71,0,-0.25,-5.7,2.3,-0.25,-5.9,1.3,-0.25,-4.2],
// 4 15 0.76 -0.25 -3.86 0.2 -0.25 -4.71 1.3 -0.25 -4.2 1.61 -0.25 -3.3
  [4,15,0.76,-0.25,-3.86,0.2,-0.25,-4.71,1.3,-0.25,-4.2,1.61,-0.25,-3.3],
// 4 15 1.61 -0.25 -3.3 1.3 -0.25 -4.2 1.9 -0.25 -4.2 2.6 -0.25 -3.1
  [4,15,1.61,-0.25,-3.3,1.3,-0.25,-4.2,1.9,-0.25,-4.2,2.6,-0.25,-3.1],
// 4 0 11 -0.25 11 -11 -0.25 11 -7 -0.25 9.5 8.5 -0.25 9.5
  [4,0,11,-0.25,11,-11,-0.25,11,-7,-0.25,9.5,8.5,-0.25,9.5],
// 3 0 11 -0.25 11 8.5 -0.25 9.5 9.2 -0.25 9.2
  [3,0,11,-0.25,11,8.5,-0.25,9.5,9.2,-0.25,9.2],
// 3 0 11 -0.25 11 9.2 -0.25 9.2 9.5 -0.25 8.5
  [3,0,11,-0.25,11,9.2,-0.25,9.2,9.5,-0.25,8.5],
// 4 0 11 -0.25 11 9.5 -0.25 8.5 9.5 -0.25 0.5 11 -0.25 -11
  [4,0,11,-0.25,11,9.5,-0.25,8.5,9.5,-0.25,0.5,11,-0.25,-11],
// 3 0 9.5 -0.25 0.5 9.2 -0.25 -0.2 11 -0.25 -11
  [3,0,9.5,-0.25,0.5,9.2,-0.25,-0.2,11,-0.25,-11],
// 3 0 9.2 -0.25 -0.2 8.5 -0.25 -0.5 11 -0.25 -11
  [3,0,9.2,-0.25,-0.2,8.5,-0.25,-0.5,11,-0.25,-11],
// 4 0 11 -0.25 -11 8.5 -0.25 -0.5 7.7 -0.25 -0.5 7.14 -0.25 -1.34
  [4,0,11,-0.25,-11,8.5,-0.25,-0.5,7.7,-0.25,-0.5,7.14,-0.25,-1.34],
// 3 0 7.14 -0.25 -1.34 6.29 -0.25 -1.9 11 -0.25 -11
  [3,0,7.14,-0.25,-1.34,6.29,-0.25,-1.9,11,-0.25,-11],
// 4 0 11 -0.25 -11 6.29 -0.25 -1.9 5.3 -0.25 -2.1 5 -0.25 -4.71
  [4,0,11,-0.25,-11,6.29,-0.25,-1.9,5.3,-0.25,-2.1,5,-0.25,-4.71],
// 3 0 5 -0.25 -4.71 5.2 -0.25 -5.7 11 -0.25 -11
  [3,0,5,-0.25,-4.71,5.2,-0.25,-5.7,11,-0.25,-11],
// 3 0 5.2 -0.25 -5.7 5 -0.25 -6.69 11 -0.25 -11
  [3,0,5.2,-0.25,-5.7,5,-0.25,-6.69,11,-0.25,-11],
// 3 0 5 -0.25 -6.69 4.44 -0.25 -7.54 11 -0.25 -11
  [3,0,5,-0.25,-6.69,4.44,-0.25,-7.54,11,-0.25,-11],
// 3 0 4.44 -0.25 -7.54 3.59 -0.25 -8.1 11 -0.25 -11
  [3,0,4.44,-0.25,-7.54,3.59,-0.25,-8.1,11,-0.25,-11],
// 3 0 3.59 -0.25 -8.1 2.6 -0.25 -8.3 11 -0.25 -11
  [3,0,3.59,-0.25,-8.1,2.6,-0.25,-8.3,11,-0.25,-11],
// 4 0 -11 -0.25 -11 11 -0.25 -11 2.6 -0.25 -8.3 1.61 -0.25 -8.1
  [4,0,-11,-0.25,-11,11,-0.25,-11,2.6,-0.25,-8.3,1.61,-0.25,-8.1],
// 3 0 0.76 -0.25 -7.54 -11 -0.25 -11 1.61 -0.25 -8.1
  [3,0,0.76,-0.25,-7.54,-11,-0.25,-11,1.61,-0.25,-8.1],
// 3 0 0.2 -0.25 -6.69 -11 -0.25 -11 0.76 -0.25 -7.54
  [3,0,0.2,-0.25,-6.69,-11,-0.25,-11,0.76,-0.25,-7.54],
// 4 0 -11 -0.25 -11 0.2 -0.25 -6.69 0 -0.25 -5.7 -3.81 -0.25 -5.9
  [4,0,-11,-0.25,-11,0.2,-0.25,-6.69,0,-0.25,-5.7,-3.81,-0.25,-5.9],
// 3 0 -3.81 -0.25 -5.9 -4.8 -0.25 -6.1 -11 -0.25 -11
  [3,0,-3.81,-0.25,-5.9,-4.8,-0.25,-6.1,-11,-0.25,-11],
// 3 0 -5.79 -0.25 -5.9 -11 -0.25 -11 -4.8 -0.25 -6.1
  [3,0,-5.79,-0.25,-5.9,-11,-0.25,-11,-4.8,-0.25,-6.1],
// 3 0 -6.64 -0.25 -5.34 -11 -0.25 -11 -5.79 -0.25 -5.9
  [3,0,-6.64,-0.25,-5.34,-11,-0.25,-11,-5.79,-0.25,-5.9],
// 3 0 -7.2 -0.25 -4.49 -11 -0.25 -11 -6.64 -0.25 -5.34
  [3,0,-7.2,-0.25,-4.49,-11,-0.25,-11,-6.64,-0.25,-5.34],
// 3 0 -7.4 -0.25 -3.5 -11 -0.25 -11 -7.2 -0.25 -4.49
  [3,0,-7.4,-0.25,-3.5,-11,-0.25,-11,-7.2,-0.25,-4.49],
// 4 0 -7.7 -0.25 -0.2 -11 -0.25 -11 -7.4 -0.25 -3.5 -7.2 -0.25 -2.51
  [4,0,-7.7,-0.25,-0.2,-11,-0.25,-11,-7.4,-0.25,-3.5,-7.2,-0.25,-2.51],
// 4 0 -7 -0.25 -0.5 -7.7 -0.25 -0.2 -7.2 -0.25 -2.51 -6.64 -0.25 -1.66
  [4,0,-7,-0.25,-0.5,-7.7,-0.25,-0.2,-7.2,-0.25,-2.51,-6.64,-0.25,-1.66],
// 3 0 -7 -0.25 -0.5 -6.64 -0.25 -1.66 -5.79 -0.25 -1.1
  [3,0,-7,-0.25,-0.5,-6.64,-0.25,-1.66,-5.79,-0.25,-1.1],
// 3 0 -7 -0.25 -0.5 -5.79 -0.25 -1.1 -4.8 -0.25 -0.9
  [3,0,-7,-0.25,-0.5,-5.79,-0.25,-1.1,-4.8,-0.25,-0.9],
// 3 0 2.9 -0.25 -0.5 -7 -0.25 -0.5 -4.8 -0.25 -0.9
  [3,0,2.9,-0.25,-0.5,-7,-0.25,-0.5,-4.8,-0.25,-0.9],
// 3 0 2.9 -0.25 -0.5 -4.8 -0.25 -0.9 -3.81 -0.25 -1.1
  [3,0,2.9,-0.25,-0.5,-4.8,-0.25,-0.9,-3.81,-0.25,-1.1],
// 3 0 2.9 -0.25 -0.5 -3.81 -0.25 -1.1 -2.96 -0.25 -1.66
  [3,0,2.9,-0.25,-0.5,-3.81,-0.25,-1.1,-2.96,-0.25,-1.66],
// 3 0 2.9 -0.25 -0.5 -2.96 -0.25 -1.66 -2.4 -0.25 -2.51
  [3,0,2.9,-0.25,-0.5,-2.96,-0.25,-1.66,-2.4,-0.25,-2.51],
// 4 0 2.9 -0.25 -0.5 -2.4 -0.25 -2.51 -2.2 -0.25 -3.5 0.76 -0.25 -3.86
  [4,0,2.9,-0.25,-0.5,-2.4,-0.25,-2.51,-2.2,-0.25,-3.5,0.76,-0.25,-3.86],
// 4 0 0.76 -0.25 -3.86 -2.2 -0.25 -3.5 -2.4 -0.25 -4.49 0.2 -0.25 -4.71
  [4,0,0.76,-0.25,-3.86,-2.2,-0.25,-3.5,-2.4,-0.25,-4.49,0.2,-0.25,-4.71],
// 4 0 0.2 -0.25 -4.71 -2.4 -0.25 -4.49 -2.96 -0.25 -5.34 0 -0.25 -5.7
  [4,0,0.2,-0.25,-4.71,-2.4,-0.25,-4.49,-2.96,-0.25,-5.34,0,-0.25,-5.7],
// 3 0 -2.96 -0.25 -5.34 -3.81 -0.25 -5.9 0 -0.25 -5.7
  [3,0,-2.96,-0.25,-5.34,-3.81,-0.25,-5.9,0,-0.25,-5.7],
// 4 0 2.9 -0.25 -0.5 0.76 -0.25 -3.86 1.61 -0.25 -3.3 3.46 -0.25 -1.34
  [4,0,2.9,-0.25,-0.5,0.76,-0.25,-3.86,1.61,-0.25,-3.3,3.46,-0.25,-1.34],
// 4 0 3.46 -0.25 -1.34 1.61 -0.25 -3.3 2.6 -0.25 -3.1 4.31 -0.25 -1.9
  [4,0,3.46,-0.25,-1.34,1.61,-0.25,-3.3,2.6,-0.25,-3.1,4.31,-0.25,-1.9],
// 4 0 4.31 -0.25 -1.9 2.6 -0.25 -3.1 3.59 -0.25 -3.3 5.3 -0.25 -2.1
  [4,0,4.31,-0.25,-1.9,2.6,-0.25,-3.1,3.59,-0.25,-3.3,5.3,-0.25,-2.1],
// 3 0 5.3 -0.25 -2.1 3.59 -0.25 -3.3 4.44 -0.25 -3.86
  [3,0,5.3,-0.25,-2.1,3.59,-0.25,-3.3,4.44,-0.25,-3.86],
// 3 0 5.3 -0.25 -2.1 4.44 -0.25 -3.86 5 -0.25 -4.71
  [3,0,5.3,-0.25,-2.1,4.44,-0.25,-3.86,5,-0.25,-4.71],
// 3 0 -8 -0.25 0.5 -11 -0.25 -11 -7.7 -0.25 -0.2
  [3,0,-8,-0.25,0.5,-11,-0.25,-11,-7.7,-0.25,-0.2],
// 4 0 -11 -0.25 11 -11 -0.25 -11 -8 -0.25 0.5 -8 -0.25 8.5
  [4,0,-11,-0.25,11,-11,-0.25,-11,-8,-0.25,0.5,-8,-0.25,8.5],
// 3 0 -11 -0.25 11 -8 -0.25 8.5 -7.7 -0.25 9.2
  [3,0,-11,-0.25,11,-8,-0.25,8.5,-7.7,-0.25,9.2],
// 3 0 -11 -0.25 11 -7.7 -0.25 9.2 -7 -0.25 9.5
  [3,0,-11,-0.25,11,-7.7,-0.25,9.2,-7,-0.25,9.5],
];
makepoly(ldraw_lib__164555g(), line=0.2);
